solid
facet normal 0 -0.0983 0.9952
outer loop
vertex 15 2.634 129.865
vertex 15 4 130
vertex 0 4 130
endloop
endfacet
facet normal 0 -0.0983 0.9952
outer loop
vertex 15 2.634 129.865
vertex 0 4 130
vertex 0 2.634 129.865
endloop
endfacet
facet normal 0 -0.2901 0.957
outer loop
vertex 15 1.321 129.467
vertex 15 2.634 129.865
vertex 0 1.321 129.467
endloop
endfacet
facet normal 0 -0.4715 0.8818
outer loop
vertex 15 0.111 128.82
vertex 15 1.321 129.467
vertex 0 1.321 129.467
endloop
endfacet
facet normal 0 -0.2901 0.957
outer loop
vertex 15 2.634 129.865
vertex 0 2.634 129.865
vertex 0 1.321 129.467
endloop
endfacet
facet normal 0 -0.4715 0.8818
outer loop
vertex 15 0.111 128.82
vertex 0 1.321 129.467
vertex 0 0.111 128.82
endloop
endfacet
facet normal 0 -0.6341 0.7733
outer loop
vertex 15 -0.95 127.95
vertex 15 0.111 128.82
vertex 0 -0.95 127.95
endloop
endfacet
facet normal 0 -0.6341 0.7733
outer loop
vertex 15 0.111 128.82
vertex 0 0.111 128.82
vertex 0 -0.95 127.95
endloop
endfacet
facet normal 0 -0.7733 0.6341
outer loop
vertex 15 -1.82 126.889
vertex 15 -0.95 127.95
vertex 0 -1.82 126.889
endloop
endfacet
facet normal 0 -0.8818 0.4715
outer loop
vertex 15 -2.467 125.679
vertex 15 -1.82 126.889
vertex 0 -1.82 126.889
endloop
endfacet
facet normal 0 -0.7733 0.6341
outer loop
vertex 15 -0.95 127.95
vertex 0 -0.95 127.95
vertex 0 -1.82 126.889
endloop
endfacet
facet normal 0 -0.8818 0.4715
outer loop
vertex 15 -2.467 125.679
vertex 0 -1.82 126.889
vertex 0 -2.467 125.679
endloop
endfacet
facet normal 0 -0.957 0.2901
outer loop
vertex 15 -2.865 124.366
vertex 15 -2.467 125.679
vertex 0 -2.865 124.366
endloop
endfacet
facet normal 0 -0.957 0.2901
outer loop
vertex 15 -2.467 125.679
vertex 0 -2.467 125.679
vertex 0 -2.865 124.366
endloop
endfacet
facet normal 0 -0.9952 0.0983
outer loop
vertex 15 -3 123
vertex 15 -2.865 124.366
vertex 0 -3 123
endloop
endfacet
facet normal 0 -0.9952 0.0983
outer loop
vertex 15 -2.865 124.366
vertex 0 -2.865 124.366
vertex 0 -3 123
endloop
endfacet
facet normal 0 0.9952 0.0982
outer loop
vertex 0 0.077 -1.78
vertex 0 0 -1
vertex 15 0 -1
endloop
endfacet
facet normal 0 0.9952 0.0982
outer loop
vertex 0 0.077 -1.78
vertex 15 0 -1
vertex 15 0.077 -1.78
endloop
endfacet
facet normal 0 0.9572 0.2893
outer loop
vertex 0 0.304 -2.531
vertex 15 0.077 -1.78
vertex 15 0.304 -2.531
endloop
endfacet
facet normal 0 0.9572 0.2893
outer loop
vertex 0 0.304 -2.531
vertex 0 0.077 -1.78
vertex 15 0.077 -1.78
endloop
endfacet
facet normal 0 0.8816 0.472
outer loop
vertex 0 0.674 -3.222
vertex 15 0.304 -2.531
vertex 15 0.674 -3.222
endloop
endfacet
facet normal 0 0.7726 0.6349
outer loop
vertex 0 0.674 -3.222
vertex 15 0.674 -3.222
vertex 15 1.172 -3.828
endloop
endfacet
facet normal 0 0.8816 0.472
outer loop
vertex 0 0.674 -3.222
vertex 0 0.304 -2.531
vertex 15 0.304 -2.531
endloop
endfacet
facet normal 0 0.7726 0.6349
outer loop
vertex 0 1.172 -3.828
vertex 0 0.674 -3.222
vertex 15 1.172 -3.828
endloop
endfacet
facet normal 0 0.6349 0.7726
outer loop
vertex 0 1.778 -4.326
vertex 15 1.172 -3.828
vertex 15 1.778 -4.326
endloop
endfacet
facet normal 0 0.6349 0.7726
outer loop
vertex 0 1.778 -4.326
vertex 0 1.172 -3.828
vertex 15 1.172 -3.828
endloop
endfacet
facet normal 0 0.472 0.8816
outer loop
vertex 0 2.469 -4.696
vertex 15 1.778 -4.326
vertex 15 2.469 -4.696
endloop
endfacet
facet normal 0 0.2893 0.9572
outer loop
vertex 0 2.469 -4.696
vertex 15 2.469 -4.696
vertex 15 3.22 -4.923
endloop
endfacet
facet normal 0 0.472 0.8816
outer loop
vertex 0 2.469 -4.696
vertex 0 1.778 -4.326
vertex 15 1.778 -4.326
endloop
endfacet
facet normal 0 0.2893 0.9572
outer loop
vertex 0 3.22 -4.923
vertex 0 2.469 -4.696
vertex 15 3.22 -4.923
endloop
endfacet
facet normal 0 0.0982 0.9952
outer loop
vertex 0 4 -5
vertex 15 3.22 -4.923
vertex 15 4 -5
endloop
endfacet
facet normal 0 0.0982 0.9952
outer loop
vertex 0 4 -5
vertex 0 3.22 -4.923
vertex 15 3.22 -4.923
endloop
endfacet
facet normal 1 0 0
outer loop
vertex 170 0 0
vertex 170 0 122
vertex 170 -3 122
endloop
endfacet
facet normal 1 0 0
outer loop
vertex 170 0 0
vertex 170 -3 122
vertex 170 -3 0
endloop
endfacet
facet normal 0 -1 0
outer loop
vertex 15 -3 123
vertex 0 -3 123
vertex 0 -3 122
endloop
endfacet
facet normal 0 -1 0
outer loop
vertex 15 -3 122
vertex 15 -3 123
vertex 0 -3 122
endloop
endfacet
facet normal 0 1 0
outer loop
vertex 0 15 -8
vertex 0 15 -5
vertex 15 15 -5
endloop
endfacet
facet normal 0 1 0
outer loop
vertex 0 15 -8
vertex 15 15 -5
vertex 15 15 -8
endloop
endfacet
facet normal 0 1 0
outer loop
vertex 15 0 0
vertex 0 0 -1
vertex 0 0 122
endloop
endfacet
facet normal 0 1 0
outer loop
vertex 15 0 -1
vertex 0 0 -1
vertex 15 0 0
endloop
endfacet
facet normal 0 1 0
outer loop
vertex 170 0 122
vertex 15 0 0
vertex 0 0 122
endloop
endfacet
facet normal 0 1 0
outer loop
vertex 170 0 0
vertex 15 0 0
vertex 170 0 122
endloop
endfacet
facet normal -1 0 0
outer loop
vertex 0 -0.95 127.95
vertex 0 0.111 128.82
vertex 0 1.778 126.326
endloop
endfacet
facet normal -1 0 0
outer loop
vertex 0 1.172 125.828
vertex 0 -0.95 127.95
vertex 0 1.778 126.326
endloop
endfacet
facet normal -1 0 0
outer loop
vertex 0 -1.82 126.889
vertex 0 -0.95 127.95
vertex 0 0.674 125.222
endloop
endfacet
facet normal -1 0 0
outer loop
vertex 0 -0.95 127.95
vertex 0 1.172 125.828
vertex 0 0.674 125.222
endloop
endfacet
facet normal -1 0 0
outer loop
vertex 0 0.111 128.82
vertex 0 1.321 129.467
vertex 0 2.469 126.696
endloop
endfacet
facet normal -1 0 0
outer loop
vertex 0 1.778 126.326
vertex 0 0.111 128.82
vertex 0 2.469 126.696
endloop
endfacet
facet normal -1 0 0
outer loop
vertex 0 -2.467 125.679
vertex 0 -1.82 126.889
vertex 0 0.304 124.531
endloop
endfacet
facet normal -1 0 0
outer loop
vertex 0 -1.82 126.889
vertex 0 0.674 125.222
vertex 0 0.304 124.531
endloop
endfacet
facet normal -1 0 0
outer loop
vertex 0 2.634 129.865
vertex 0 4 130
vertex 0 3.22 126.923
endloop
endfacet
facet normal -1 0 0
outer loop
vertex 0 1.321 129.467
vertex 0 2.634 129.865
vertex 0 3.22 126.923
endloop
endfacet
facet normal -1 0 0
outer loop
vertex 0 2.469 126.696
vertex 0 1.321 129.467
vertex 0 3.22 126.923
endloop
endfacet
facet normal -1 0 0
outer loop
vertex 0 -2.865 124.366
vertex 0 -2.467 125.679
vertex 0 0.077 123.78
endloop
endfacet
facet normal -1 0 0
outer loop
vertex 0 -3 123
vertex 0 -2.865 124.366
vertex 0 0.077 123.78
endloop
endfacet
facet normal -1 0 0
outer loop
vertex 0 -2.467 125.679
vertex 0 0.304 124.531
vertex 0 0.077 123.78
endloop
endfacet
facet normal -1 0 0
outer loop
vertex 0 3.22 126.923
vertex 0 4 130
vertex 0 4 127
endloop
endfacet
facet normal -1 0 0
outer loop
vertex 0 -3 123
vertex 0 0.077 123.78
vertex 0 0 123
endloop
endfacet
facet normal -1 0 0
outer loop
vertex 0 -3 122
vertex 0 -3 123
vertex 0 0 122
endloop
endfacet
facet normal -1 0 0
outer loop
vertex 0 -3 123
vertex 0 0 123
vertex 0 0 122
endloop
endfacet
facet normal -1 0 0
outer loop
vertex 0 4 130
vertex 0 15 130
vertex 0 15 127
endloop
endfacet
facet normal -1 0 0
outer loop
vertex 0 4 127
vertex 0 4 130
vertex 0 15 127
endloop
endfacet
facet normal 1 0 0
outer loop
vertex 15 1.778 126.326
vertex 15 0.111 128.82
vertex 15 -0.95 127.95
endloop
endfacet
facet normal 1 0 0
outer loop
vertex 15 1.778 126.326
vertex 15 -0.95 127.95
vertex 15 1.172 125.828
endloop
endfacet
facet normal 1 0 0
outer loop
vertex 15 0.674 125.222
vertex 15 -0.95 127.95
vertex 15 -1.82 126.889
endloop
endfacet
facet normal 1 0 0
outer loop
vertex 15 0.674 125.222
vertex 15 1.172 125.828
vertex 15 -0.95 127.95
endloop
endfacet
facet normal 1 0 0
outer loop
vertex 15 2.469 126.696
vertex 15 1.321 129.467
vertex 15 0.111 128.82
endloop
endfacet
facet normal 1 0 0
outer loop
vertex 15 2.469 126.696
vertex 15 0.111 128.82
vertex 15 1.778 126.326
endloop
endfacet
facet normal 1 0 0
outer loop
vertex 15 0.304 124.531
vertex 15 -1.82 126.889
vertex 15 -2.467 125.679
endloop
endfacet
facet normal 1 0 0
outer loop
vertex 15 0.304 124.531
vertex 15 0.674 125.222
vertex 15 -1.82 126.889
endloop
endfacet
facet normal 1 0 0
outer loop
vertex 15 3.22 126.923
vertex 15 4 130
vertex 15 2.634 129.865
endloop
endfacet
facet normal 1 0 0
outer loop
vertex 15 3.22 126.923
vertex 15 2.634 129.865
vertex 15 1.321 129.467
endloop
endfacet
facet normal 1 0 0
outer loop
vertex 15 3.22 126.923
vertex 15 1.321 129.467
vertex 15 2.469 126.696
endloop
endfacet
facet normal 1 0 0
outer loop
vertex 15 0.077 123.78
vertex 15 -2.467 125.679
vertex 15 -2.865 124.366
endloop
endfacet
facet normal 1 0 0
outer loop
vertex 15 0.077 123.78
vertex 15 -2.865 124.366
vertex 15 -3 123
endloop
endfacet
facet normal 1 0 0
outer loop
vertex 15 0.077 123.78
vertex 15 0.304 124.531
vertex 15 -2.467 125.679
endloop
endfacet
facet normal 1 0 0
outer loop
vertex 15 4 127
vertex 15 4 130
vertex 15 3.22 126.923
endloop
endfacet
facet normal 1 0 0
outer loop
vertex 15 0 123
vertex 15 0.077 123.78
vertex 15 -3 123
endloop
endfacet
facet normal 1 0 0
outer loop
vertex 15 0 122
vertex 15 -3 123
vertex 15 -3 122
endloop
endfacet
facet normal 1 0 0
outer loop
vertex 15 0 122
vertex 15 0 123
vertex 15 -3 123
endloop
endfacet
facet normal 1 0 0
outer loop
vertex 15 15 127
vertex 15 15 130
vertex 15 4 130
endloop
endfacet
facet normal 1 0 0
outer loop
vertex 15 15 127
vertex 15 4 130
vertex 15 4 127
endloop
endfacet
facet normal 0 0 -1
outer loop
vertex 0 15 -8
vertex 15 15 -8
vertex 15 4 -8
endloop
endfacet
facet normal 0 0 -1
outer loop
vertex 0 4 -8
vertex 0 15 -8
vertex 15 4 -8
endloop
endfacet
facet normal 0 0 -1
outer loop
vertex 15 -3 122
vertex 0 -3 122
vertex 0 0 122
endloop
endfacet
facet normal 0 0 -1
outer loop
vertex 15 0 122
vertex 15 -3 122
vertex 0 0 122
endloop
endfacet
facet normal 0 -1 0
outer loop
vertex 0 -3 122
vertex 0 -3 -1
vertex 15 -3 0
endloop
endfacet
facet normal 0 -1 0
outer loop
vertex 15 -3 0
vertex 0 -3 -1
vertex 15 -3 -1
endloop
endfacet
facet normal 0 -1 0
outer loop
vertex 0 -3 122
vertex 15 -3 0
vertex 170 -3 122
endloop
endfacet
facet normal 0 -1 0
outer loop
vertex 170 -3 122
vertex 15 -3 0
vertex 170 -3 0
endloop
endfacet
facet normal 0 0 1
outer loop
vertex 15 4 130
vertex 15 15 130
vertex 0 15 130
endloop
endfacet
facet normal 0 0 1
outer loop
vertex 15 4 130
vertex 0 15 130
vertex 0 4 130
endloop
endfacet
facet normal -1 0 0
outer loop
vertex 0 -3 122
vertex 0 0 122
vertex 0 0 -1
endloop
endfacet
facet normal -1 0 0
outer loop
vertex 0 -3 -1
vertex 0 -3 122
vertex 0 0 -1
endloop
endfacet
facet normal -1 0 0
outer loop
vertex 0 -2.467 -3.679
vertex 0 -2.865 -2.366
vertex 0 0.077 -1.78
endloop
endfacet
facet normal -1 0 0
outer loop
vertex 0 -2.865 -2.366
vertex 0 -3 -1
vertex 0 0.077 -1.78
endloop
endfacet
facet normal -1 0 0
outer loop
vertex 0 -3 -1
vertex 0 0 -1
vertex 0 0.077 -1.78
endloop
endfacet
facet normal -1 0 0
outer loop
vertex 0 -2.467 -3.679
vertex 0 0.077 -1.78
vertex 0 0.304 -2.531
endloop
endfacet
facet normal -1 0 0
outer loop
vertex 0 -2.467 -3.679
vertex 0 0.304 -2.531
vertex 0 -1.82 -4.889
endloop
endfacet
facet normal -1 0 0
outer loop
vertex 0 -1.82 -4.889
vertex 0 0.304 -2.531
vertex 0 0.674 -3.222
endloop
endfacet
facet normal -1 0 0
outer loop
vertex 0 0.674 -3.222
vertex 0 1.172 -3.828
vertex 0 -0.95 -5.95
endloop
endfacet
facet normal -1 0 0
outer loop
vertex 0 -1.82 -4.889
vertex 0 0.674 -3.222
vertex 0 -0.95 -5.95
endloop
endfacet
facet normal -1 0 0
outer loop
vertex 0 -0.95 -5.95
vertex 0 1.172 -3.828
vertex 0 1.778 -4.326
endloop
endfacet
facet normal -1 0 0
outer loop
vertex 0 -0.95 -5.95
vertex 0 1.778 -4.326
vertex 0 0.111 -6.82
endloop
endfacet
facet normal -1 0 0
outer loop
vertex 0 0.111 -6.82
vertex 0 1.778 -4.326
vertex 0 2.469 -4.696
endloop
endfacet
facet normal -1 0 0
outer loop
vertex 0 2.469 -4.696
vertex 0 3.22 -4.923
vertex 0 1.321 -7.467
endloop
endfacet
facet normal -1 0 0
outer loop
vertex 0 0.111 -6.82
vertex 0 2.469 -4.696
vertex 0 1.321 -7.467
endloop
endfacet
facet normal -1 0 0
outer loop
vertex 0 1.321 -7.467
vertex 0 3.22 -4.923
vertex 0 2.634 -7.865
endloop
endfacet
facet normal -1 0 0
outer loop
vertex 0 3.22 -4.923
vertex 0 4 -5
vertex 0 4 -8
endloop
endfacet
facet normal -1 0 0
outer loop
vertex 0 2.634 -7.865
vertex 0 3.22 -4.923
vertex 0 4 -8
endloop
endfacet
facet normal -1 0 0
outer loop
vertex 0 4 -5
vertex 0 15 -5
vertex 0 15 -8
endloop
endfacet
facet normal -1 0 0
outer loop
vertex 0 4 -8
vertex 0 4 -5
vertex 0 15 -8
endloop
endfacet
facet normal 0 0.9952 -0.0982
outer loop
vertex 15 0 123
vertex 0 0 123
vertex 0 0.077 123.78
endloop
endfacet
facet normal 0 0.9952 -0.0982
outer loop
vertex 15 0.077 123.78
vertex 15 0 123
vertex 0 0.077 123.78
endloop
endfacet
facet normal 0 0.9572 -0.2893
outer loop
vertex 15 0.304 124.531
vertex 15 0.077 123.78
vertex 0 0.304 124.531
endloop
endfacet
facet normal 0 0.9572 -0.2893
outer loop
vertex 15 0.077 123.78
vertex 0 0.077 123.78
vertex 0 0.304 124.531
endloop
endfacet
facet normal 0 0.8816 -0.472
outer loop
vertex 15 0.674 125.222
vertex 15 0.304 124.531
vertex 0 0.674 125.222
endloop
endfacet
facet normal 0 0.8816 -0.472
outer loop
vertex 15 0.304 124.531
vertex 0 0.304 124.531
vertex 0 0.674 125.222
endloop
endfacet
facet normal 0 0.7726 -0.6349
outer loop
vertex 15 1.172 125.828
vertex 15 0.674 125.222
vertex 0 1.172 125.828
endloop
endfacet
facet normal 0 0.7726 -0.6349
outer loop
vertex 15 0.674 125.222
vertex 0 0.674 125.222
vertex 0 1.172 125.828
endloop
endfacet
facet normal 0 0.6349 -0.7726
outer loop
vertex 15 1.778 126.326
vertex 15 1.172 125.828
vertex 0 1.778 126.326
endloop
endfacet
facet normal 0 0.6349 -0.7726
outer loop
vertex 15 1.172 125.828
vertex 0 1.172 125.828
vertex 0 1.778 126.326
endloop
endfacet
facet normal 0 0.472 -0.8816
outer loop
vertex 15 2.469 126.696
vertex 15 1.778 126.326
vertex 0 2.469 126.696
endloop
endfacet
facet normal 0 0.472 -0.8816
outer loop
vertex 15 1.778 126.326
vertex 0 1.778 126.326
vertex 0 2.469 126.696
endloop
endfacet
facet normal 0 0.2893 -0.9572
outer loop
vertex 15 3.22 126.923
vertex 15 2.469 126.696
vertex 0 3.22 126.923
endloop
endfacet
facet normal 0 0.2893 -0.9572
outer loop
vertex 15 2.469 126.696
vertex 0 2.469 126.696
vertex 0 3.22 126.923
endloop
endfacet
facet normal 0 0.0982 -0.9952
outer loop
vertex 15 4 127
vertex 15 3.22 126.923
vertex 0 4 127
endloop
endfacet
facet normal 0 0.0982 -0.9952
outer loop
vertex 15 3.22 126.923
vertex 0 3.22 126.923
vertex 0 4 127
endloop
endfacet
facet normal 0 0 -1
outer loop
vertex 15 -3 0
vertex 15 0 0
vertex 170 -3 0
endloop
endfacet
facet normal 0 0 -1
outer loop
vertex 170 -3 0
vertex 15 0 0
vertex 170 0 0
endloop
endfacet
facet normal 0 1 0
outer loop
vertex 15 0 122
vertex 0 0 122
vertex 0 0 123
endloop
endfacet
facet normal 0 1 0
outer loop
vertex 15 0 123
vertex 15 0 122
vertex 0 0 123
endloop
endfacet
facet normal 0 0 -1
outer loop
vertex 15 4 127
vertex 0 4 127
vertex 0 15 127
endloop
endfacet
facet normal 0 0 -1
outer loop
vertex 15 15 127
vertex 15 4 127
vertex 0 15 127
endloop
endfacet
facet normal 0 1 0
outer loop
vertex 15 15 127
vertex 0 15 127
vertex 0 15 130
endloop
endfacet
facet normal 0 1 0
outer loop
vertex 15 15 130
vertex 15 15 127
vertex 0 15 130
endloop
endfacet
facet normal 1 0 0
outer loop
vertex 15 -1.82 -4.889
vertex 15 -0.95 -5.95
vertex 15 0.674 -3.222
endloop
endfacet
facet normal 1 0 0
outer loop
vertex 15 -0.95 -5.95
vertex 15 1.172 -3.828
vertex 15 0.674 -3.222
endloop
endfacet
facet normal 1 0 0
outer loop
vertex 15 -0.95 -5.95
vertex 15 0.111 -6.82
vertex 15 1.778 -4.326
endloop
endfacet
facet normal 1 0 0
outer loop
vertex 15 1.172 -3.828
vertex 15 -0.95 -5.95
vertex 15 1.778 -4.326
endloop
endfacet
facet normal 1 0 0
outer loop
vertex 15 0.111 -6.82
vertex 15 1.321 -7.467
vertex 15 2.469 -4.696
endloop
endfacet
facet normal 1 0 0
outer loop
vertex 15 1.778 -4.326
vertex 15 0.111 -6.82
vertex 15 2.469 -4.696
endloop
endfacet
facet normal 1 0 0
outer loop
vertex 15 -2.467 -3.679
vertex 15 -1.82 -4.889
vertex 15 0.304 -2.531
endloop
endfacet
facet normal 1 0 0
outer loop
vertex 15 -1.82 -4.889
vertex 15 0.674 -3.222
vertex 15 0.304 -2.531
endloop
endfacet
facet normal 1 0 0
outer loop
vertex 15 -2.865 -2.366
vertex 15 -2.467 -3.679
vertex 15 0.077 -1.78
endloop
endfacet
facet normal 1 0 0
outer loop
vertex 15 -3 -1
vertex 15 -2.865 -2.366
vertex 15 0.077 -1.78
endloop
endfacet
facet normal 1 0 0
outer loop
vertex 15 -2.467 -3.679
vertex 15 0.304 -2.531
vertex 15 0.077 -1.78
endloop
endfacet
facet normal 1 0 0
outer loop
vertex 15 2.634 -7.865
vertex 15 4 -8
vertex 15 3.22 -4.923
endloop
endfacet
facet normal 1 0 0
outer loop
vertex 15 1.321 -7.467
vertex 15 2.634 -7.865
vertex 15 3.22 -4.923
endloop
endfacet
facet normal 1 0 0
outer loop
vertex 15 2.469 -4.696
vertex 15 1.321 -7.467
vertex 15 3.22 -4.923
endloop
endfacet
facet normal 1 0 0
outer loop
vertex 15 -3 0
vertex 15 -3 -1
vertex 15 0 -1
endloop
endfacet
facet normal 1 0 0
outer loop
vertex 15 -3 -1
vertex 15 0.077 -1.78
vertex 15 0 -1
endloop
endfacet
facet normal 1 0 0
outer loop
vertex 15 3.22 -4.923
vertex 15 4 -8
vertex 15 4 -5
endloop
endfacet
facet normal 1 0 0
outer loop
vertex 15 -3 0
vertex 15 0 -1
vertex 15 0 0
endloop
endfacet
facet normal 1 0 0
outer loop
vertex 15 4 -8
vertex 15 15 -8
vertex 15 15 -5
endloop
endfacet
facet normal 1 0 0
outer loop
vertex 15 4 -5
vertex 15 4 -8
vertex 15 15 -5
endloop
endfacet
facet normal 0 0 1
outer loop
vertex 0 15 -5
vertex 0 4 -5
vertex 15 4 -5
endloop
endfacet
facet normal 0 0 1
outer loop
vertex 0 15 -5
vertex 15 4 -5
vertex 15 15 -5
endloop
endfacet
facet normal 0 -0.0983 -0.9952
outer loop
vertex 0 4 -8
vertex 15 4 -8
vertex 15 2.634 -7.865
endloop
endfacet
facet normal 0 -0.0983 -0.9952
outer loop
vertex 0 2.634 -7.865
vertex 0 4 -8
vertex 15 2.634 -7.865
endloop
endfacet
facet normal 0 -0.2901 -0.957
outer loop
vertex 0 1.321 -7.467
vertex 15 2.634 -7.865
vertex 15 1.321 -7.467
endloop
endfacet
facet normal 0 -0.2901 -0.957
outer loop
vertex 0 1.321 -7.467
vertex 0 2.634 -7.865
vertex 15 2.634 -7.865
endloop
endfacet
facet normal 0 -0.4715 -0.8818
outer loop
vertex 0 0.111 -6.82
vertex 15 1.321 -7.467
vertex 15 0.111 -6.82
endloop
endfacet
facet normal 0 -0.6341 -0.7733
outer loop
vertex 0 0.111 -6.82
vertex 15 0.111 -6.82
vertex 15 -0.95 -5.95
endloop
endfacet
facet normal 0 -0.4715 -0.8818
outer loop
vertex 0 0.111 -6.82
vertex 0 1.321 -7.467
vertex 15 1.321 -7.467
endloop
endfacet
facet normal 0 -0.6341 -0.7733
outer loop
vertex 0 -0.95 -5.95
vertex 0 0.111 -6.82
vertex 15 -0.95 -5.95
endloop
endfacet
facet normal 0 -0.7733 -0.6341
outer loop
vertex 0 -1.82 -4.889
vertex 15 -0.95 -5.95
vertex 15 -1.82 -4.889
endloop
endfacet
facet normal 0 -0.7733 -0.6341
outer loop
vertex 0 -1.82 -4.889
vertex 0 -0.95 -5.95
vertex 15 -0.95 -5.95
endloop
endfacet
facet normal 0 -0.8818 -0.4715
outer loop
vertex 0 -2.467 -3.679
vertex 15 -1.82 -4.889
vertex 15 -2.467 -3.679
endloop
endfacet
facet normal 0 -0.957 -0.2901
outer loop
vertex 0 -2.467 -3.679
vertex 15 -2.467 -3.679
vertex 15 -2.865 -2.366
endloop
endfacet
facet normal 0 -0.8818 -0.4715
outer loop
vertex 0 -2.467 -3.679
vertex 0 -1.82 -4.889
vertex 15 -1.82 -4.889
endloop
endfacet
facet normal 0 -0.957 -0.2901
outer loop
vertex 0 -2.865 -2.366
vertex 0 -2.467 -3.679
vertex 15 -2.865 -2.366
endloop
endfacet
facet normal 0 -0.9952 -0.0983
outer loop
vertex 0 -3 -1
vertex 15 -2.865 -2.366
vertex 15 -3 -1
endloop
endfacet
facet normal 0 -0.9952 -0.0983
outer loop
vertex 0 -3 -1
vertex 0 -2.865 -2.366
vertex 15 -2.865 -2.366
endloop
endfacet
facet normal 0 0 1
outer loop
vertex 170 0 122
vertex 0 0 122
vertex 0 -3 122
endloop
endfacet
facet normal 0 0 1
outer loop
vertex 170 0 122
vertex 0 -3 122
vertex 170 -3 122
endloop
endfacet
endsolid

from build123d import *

# Parameters (mm, degrees)
BRIDA_BASE1_DEPTH       = 15
CROQUIS6_W              = 170
CROQUIS6_H              = 122
SALIENTE_EXTRUIR1_DEPTH = 3
BRIDA_BASE2_DEPTH       = 15


# Sheet-metal steps are written as plain solids
with BuildPart() as part:
    # Croquis1 → Brida base1 (new body)
    with BuildSketch(Plane(origin=(0, 0, 0), x_dir=(0, 0, -1), z_dir=(1, 0, 0))):
        with BuildLine():
            Line((0, 0), (1, 0))
            ThreePointArc((1, 0), (3.828427125, 1.171572875), (5, 4))
            Line((5, 4), (5, 15))
            Line((5, 15), (8, 15))
            Line((8, 15), (8, 4))
            ThreePointArc((8, 4), (5.949747468, -0.949747468), (1, -3))
            Line((1, -3), (0, -3))
            Line((0, -3), (0, 0))
        make_face()
    extrude(amount=BRIDA_BASE1_DEPTH)

    # Croquis6 → Saliente-Extruir1 (add)
    with BuildSketch(Plane(origin=(0, 0, 0), x_dir=(1, 0, 0), z_dir=(0, 1, 0))):
        with Locations((85, -61)):
            Rectangle(CROQUIS6_W, CROQUIS6_H)
    extrude(amount=-SALIENTE_EXTRUIR1_DEPTH)


with BuildPart() as body_2:
    # Croquis7 → Brida base2 (new body)
    with BuildSketch(Plane.ZY):
        with BuildLine():
            Line((122, 0), (123, 0))
            ThreePointArc((123, 0), (125.828427125, 1.171572875), (127, 4))
            Line((127, 4), (127, 15))
            Line((127, 15), (130, 15))
            Line((130, 15), (130, 4))
            ThreePointArc((130, 4), (127.949747468, -0.949747468), (123, -3))
            Line((123, -3), (122, -3))
            Line((122, -3), (122, 0))
        make_face()
    extrude(amount=-BRIDA_BASE2_DEPTH)


solid = Compound([part.part, body_2.part])
